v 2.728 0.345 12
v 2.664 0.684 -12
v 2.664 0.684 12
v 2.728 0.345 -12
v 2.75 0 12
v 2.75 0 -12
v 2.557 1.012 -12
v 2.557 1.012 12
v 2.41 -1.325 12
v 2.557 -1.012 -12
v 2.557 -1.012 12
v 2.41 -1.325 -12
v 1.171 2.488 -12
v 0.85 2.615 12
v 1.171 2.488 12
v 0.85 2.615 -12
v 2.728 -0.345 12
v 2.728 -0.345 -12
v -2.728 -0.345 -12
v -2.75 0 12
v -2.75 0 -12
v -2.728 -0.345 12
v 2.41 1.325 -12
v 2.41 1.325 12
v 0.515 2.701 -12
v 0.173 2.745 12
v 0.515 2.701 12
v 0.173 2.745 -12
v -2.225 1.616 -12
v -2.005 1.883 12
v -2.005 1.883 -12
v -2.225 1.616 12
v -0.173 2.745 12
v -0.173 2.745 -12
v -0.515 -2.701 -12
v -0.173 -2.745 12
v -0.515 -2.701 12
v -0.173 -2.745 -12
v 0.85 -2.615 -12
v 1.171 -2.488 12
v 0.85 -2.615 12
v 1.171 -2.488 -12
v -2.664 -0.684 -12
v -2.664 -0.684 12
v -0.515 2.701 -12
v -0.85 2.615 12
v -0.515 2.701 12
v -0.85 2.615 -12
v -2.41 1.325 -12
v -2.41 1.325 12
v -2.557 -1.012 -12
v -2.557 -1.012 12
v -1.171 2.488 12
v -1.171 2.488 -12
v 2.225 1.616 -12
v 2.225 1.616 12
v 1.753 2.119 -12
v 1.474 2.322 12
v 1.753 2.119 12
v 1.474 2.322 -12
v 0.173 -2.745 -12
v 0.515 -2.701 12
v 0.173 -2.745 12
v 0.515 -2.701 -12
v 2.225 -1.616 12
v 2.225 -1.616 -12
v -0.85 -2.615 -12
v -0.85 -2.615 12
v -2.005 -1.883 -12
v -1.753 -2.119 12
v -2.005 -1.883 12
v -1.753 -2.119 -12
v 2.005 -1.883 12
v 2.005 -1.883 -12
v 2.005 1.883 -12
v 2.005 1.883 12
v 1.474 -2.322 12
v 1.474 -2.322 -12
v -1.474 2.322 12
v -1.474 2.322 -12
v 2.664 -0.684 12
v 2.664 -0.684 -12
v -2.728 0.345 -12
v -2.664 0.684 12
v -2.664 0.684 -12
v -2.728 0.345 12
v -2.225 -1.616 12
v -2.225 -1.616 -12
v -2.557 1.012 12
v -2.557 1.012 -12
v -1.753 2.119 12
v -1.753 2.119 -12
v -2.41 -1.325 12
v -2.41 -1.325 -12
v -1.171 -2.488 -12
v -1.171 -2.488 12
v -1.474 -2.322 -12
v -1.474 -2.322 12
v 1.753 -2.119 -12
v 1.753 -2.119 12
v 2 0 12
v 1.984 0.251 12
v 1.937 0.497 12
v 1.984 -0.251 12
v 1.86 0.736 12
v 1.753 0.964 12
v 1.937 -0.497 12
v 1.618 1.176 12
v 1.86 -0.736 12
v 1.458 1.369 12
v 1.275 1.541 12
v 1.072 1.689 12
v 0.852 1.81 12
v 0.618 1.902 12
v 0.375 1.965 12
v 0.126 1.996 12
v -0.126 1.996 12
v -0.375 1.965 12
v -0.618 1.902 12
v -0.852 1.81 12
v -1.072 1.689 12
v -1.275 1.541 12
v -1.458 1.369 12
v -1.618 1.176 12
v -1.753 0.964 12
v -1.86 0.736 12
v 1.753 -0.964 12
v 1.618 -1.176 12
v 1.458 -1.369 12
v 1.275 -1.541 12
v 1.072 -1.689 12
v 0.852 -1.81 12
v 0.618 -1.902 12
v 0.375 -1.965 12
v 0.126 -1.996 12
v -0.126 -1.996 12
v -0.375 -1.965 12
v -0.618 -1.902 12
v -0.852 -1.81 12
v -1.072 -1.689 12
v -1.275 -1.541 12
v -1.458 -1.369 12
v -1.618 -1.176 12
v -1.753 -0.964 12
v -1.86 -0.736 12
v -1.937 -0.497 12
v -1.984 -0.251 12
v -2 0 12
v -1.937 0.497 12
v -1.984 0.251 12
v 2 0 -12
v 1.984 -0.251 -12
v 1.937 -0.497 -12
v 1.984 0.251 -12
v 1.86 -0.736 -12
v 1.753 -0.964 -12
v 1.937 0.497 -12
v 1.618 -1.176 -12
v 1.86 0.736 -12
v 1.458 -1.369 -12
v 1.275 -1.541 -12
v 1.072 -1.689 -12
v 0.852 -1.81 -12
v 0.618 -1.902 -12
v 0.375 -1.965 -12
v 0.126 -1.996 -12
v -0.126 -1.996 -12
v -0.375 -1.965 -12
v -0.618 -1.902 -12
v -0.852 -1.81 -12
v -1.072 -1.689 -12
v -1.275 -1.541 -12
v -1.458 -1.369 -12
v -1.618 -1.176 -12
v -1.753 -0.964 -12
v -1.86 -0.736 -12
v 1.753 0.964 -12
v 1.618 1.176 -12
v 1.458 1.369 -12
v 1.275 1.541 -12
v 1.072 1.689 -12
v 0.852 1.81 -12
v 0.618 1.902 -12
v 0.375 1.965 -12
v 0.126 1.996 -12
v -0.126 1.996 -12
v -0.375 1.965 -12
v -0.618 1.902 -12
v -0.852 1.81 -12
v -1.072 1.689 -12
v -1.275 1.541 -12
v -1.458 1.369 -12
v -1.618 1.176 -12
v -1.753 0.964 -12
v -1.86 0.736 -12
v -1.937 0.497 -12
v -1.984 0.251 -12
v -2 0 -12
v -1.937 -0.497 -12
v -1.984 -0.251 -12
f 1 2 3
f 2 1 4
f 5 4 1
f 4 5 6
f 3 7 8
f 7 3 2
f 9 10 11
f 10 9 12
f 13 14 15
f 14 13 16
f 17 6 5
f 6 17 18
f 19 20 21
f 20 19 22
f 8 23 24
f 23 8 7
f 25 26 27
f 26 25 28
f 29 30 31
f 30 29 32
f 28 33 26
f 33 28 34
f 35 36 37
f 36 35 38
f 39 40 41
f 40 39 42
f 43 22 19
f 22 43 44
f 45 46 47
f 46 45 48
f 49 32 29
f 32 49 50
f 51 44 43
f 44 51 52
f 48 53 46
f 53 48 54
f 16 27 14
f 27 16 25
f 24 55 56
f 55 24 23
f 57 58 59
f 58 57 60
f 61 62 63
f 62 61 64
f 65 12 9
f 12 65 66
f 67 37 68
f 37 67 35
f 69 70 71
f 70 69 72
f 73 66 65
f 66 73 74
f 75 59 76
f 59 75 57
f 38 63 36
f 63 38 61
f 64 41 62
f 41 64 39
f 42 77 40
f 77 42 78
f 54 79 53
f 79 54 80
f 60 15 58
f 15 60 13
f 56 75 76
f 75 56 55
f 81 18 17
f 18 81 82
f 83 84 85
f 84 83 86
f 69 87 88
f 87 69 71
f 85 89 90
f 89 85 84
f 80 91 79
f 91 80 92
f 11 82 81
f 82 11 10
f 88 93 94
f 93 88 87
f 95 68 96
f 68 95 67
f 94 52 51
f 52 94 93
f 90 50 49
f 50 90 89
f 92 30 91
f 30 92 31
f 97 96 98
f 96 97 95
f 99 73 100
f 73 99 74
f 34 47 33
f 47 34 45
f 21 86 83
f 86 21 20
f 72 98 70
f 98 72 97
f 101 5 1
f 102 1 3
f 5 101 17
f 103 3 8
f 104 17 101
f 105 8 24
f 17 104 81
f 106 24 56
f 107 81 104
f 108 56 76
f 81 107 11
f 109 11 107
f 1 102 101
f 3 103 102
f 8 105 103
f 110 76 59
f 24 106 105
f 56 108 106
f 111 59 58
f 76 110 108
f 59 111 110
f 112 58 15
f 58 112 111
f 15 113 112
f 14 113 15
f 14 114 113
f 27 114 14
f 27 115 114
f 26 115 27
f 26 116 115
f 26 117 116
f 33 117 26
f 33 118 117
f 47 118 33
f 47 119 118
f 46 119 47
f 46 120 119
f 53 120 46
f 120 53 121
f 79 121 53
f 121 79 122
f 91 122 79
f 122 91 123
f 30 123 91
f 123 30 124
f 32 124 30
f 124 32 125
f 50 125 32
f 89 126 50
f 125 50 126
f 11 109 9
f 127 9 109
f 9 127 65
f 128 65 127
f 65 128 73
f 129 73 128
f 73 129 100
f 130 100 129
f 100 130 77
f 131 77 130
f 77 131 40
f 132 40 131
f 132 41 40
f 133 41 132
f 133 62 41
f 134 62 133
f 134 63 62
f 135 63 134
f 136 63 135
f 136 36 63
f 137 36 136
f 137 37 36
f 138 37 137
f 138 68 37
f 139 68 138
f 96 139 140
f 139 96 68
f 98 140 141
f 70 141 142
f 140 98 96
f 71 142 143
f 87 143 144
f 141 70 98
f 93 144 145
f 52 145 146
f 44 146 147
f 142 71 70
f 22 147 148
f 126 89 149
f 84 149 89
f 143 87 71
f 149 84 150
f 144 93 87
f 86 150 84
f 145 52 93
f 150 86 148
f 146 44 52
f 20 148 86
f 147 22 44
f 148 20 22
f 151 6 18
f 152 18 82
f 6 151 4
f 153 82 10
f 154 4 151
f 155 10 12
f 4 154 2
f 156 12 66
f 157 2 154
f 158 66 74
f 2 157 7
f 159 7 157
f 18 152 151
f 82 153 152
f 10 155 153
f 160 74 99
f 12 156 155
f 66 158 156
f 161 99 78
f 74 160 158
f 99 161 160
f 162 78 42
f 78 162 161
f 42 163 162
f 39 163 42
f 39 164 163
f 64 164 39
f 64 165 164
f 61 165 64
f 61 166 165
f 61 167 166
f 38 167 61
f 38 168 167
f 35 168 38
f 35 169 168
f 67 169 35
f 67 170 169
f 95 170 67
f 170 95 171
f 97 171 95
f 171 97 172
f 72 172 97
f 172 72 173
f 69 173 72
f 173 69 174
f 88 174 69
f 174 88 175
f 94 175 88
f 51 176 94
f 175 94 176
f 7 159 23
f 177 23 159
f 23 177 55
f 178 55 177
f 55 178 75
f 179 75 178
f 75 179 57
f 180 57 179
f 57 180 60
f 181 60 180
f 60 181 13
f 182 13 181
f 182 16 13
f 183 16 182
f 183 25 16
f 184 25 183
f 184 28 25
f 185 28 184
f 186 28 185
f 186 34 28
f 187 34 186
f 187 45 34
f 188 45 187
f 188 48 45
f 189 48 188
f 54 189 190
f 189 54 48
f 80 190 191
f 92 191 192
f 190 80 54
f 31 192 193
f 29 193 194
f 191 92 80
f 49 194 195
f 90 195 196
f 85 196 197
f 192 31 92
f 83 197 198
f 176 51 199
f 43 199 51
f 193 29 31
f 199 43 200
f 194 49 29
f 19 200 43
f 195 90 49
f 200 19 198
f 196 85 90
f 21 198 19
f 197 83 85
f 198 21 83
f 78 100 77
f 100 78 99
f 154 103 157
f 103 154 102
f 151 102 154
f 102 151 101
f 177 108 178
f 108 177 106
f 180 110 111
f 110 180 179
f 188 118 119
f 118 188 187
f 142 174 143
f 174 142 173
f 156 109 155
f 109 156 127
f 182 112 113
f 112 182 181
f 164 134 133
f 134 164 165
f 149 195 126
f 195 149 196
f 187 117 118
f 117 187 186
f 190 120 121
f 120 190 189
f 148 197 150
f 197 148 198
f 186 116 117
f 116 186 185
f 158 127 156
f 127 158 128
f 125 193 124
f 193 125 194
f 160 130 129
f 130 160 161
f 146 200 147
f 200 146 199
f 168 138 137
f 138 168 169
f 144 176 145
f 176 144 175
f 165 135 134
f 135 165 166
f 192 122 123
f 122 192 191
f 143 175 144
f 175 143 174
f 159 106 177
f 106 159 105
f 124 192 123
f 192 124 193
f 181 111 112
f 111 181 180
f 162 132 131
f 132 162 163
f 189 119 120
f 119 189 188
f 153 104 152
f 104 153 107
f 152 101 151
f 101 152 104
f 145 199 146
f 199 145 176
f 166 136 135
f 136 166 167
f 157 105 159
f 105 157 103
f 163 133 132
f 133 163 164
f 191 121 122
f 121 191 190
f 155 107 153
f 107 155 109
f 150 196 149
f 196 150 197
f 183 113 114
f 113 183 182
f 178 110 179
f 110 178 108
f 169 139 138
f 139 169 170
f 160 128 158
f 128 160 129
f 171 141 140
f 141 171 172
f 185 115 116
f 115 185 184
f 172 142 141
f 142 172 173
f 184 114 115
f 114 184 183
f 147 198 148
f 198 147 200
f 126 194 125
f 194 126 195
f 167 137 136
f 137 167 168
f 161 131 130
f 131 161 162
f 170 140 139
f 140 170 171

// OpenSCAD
$fn = 50;


difference() {
	union() {
		translate(v = [0, 0, -12.0000000000]) {
			cylinder(h = 24, r = 2.7500000000);
		}
	}
	union() {
		translate(v = [0, 0, -100.0000000000]) {
			cylinder(h = 200, r = 2.0000000000);
		}
	}
}
